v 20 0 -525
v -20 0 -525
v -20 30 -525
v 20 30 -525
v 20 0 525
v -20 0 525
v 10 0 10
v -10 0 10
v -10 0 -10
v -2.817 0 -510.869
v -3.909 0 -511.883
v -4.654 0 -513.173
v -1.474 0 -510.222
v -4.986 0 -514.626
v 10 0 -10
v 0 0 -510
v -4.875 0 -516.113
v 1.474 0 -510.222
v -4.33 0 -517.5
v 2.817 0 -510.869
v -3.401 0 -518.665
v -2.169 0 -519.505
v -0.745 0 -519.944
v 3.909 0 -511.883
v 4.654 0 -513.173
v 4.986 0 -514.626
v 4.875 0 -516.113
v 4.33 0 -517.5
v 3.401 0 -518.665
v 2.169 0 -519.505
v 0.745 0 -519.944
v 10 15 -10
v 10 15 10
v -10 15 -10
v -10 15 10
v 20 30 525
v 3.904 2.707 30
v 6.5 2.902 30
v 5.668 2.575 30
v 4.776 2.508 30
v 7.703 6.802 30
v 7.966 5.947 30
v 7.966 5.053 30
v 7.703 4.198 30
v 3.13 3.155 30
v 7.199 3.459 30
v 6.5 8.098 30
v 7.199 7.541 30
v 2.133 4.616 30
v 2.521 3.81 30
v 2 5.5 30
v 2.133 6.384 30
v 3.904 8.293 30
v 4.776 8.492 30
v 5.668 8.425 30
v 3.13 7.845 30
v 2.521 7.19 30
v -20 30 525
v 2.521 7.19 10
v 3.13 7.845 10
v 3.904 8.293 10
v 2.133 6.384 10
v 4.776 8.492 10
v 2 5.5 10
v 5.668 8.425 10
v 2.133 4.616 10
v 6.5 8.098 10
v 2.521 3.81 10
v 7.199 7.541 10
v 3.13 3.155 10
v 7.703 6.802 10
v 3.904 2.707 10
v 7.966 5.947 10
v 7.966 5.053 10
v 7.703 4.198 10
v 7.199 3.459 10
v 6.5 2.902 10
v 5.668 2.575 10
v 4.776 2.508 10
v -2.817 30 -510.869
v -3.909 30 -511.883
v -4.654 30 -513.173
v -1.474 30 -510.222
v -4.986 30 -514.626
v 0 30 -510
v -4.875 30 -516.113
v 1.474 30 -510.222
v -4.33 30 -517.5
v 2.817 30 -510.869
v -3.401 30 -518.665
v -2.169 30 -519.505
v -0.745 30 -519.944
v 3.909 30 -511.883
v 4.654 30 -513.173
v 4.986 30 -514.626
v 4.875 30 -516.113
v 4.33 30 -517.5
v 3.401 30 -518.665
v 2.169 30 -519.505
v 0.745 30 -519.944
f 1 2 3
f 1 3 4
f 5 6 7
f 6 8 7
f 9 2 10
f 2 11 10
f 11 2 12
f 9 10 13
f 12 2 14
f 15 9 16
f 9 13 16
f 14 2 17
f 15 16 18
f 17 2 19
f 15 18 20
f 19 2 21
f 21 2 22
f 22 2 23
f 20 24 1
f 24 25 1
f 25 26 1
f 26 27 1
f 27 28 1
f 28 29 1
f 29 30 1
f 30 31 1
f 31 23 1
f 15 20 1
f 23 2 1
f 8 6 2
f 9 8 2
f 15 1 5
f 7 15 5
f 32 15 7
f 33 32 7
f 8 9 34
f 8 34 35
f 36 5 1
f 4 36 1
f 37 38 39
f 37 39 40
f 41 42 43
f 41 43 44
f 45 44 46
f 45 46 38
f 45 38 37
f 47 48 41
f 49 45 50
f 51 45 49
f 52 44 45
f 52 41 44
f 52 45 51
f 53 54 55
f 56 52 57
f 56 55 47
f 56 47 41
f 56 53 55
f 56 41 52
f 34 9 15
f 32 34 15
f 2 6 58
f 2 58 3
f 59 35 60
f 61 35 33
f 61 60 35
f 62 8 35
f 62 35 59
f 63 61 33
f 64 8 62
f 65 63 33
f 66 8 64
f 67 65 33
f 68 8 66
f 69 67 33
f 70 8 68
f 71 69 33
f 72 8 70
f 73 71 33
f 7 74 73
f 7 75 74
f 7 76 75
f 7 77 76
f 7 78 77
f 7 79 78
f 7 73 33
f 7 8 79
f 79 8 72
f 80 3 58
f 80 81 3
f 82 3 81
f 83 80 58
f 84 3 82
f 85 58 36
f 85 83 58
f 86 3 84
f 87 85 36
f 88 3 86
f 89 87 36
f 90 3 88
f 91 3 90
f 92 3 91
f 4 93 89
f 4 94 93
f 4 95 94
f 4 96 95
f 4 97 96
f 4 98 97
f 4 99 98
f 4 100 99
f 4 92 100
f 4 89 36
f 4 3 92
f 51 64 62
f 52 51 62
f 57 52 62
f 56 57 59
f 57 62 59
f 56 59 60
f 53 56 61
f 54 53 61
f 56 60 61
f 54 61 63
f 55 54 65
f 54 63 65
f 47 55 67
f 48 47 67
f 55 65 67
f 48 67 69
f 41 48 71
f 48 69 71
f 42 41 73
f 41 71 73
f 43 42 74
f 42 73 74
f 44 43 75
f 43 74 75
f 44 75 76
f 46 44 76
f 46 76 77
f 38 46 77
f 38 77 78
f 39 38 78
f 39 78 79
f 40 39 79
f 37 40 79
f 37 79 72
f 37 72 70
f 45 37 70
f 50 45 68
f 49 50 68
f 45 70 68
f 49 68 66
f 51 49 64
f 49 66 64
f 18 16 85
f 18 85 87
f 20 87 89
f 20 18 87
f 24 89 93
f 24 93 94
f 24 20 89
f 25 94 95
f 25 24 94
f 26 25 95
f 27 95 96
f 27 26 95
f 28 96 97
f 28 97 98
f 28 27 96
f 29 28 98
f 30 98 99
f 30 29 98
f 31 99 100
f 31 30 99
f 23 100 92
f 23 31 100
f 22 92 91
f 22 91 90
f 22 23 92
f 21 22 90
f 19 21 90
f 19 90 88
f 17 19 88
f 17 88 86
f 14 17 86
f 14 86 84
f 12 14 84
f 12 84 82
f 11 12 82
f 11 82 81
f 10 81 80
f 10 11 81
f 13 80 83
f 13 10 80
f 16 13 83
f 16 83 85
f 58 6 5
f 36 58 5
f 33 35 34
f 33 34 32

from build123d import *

# Parameters (mm, degrees)
SKETCH_1_W          = 40
SKETCH_1_H          = 1050
SKETCH_1_R          = 5
EXTRUDE_1_DEPTH     = 30
SKETCH_4_W          = 20
SKETCH_4_H          = 20
CUT_EXTRUDE_1_DEPTH = 15
SKETCH_6_R          = 3
CUT_EXTRUDE_2_DEPTH = 20


with BuildPart() as part:
    # 草图1 → 凸台-拉伸1 (new body)
    with BuildSketch(Plane(origin=(0, 0, 0), x_dir=(1, 0, 0), z_dir=(0, 1, 0))):
        Rectangle(SKETCH_1_W, SKETCH_1_H)
        with Locations(Location((0, 515, 0), (0, 0, 270))):
            Circle(SKETCH_1_R, mode=Mode.SUBTRACT)
    extrude(amount=EXTRUDE_1_DEPTH)

    # 草图4 → 切除-拉伸1 (cut)
    with BuildSketch(Plane.XZ):
        Rectangle(SKETCH_4_W, SKETCH_4_H)
    extrude(amount=-CUT_EXTRUDE_1_DEPTH, mode=Mode.SUBTRACT)

    # 草图6 → 切除-拉伸2 (cut)
    with BuildSketch(Plane(origin=(0, 0, 10), x_dir=(-1, 0, 0), z_dir=(0, 0, -1))):
        with Locations((-5, 5.5)):
            Circle(SKETCH_6_R)
    extrude(amount=-CUT_EXTRUDE_2_DEPTH, mode=Mode.SUBTRACT)


solid = part.part
